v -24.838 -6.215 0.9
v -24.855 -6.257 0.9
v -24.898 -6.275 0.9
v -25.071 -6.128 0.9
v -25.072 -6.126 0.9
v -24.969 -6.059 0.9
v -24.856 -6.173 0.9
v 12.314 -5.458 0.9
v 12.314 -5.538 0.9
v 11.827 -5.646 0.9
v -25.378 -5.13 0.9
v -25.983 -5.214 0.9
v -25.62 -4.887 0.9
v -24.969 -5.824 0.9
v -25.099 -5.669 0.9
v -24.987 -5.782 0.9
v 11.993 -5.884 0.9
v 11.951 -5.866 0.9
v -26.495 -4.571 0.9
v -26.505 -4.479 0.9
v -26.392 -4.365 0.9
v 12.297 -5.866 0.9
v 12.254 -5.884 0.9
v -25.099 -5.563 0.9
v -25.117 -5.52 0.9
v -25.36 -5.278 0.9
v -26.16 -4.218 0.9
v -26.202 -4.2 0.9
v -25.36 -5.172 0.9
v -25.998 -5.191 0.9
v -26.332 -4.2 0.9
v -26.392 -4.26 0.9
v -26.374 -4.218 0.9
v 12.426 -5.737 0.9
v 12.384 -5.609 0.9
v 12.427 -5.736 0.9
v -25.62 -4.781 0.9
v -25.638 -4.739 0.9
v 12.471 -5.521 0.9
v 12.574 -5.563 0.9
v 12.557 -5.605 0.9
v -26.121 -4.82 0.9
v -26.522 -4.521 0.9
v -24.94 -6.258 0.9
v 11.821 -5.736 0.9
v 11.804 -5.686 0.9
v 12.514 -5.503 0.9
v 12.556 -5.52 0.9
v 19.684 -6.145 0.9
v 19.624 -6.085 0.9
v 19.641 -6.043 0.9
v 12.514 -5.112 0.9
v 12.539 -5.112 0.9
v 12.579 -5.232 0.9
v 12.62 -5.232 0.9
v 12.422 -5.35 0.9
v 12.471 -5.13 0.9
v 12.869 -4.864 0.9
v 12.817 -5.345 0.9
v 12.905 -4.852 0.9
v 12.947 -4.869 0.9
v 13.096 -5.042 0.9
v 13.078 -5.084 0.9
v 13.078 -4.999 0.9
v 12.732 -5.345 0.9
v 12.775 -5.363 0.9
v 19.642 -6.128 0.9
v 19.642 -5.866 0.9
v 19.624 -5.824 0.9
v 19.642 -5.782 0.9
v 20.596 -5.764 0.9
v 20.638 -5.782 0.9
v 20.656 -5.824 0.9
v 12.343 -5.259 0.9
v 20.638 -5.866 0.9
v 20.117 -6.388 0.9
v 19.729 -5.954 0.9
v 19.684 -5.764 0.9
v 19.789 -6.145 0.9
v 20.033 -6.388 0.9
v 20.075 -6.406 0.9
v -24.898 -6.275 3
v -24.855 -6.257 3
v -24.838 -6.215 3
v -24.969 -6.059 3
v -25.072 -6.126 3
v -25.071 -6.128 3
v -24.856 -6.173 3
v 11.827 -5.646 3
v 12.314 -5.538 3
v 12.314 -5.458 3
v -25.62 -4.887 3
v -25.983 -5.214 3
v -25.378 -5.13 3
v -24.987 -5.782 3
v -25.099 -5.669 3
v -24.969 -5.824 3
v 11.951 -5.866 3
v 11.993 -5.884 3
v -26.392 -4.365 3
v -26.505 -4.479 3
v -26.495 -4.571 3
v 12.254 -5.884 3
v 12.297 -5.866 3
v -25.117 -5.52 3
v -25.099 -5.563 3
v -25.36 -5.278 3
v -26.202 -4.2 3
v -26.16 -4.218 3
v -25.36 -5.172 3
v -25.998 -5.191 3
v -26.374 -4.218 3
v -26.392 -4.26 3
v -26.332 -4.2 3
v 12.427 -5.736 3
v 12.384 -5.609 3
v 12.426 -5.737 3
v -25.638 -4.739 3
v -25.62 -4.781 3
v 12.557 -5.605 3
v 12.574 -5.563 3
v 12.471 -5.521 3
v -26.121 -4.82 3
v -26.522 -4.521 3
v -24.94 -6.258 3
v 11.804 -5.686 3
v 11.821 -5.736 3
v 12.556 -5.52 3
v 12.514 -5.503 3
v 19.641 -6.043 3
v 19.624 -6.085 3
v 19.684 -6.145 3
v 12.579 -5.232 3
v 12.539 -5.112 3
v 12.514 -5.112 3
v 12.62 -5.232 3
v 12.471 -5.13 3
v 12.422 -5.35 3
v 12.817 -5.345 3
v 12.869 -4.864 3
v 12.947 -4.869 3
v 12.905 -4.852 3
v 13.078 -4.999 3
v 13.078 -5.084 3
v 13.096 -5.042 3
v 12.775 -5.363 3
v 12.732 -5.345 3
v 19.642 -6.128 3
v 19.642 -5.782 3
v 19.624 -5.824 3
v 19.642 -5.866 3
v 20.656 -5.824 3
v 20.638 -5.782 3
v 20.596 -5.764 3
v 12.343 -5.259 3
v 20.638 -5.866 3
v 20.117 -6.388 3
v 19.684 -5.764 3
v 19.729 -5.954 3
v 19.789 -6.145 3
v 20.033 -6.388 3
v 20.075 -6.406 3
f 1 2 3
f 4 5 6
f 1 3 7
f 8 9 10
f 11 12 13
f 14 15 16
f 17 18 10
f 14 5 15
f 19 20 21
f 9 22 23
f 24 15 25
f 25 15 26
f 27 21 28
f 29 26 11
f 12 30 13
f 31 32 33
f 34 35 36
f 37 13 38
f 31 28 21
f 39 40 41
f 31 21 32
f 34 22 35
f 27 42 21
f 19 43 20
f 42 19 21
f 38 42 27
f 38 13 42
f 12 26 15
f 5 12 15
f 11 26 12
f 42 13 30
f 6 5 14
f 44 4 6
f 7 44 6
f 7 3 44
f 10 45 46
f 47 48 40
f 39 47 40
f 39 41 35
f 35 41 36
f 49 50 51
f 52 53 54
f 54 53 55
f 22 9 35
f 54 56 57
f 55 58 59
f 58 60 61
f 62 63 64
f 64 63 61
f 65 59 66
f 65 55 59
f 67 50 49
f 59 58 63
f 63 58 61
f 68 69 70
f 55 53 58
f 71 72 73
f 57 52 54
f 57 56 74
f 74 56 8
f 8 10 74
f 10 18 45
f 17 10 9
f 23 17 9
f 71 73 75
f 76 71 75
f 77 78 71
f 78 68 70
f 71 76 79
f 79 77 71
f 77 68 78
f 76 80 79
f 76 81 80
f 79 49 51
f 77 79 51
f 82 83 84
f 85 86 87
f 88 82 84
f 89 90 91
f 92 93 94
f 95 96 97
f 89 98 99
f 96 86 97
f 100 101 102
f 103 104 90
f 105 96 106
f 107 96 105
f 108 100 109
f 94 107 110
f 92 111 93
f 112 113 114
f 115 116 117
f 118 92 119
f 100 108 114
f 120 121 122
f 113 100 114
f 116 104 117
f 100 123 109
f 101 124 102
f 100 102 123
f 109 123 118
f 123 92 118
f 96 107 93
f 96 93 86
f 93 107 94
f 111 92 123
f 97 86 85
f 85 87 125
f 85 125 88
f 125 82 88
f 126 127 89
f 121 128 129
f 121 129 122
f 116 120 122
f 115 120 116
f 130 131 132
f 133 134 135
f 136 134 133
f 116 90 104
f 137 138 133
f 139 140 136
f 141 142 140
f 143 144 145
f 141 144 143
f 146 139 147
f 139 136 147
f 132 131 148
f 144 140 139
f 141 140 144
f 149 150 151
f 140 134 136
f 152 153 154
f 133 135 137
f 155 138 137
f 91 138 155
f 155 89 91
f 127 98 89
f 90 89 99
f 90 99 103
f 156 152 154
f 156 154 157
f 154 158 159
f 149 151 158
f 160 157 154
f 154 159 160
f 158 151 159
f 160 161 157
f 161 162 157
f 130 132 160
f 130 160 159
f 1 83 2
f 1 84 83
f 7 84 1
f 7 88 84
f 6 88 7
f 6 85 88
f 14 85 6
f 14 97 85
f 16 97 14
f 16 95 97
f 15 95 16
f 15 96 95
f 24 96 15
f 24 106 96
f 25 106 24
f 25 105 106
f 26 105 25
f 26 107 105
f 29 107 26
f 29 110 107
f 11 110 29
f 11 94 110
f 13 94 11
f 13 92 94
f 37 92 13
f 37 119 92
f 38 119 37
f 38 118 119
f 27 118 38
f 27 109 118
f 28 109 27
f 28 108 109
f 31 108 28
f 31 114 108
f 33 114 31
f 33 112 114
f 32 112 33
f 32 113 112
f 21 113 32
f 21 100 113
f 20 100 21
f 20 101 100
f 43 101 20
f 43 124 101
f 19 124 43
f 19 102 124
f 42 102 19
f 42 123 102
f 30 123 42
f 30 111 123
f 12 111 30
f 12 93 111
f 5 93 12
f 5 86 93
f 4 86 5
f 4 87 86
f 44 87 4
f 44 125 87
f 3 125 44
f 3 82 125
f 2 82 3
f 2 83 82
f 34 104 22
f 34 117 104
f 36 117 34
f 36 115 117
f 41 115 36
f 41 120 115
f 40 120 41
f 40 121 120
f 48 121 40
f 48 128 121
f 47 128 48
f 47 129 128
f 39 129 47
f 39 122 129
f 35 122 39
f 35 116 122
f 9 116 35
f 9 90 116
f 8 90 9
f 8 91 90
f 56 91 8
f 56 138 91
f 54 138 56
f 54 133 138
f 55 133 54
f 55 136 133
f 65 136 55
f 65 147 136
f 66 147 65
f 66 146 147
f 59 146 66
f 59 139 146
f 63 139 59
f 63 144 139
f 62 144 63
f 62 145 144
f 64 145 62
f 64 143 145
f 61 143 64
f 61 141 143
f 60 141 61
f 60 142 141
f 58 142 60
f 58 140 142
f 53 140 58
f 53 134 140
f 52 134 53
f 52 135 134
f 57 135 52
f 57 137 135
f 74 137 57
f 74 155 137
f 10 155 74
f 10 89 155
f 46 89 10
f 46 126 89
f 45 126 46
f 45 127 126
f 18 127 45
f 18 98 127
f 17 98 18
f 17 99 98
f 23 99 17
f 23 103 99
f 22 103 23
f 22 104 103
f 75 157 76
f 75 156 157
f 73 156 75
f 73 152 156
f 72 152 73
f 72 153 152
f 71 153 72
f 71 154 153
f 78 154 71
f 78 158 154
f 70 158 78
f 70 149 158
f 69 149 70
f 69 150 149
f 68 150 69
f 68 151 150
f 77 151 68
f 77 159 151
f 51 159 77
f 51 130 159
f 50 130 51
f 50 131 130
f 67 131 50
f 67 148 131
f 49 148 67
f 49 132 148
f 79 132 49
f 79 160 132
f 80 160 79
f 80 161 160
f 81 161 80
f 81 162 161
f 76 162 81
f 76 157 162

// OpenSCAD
$fn = 24;
translate([0, -2.500, 0.900])
  linear_extrude(height=2.100) {
offset(r=0.06, $fn=8) {
    polygon(points=[[19.554,-3.324],[19.684,-3.324],[19.814,-3.454],[19.684,-3.585],[19.814,-3.585],[20.075,-3.846],[20.596,-3.324],[20.857,-3.324]], paths=[[0,1,2,3,4,5,6,7]]);
    polygon(points=[[13.036,-2.542],[12.905,-2.412],[11.863,-3.194],[11.993,-3.324],[12.254,-3.324],[12.514,-3.063],[12.384,-3.194],[12.254,-3.063],[12.254,-2.933],[12.514,-2.672],[12.645,-2.672],[12.775,-2.803]], paths=[[0,1,2,3,4,5,6,7,8,9,10,11]]);
    polygon(points=[[-26.332,-1.760],[-26.332,-1.890],[-26.462,-2.021],[-26.071,-2.281],[-25.941,-2.672],[-24.898,-3.715],[-25.029,-3.585],[-25.029,-3.324],[-25.159,-3.194],[-25.159,-3.063],[-25.420,-2.803],[-25.420,-2.672],[-25.680,-2.412],[-25.680,-2.281],[-26.202,-1.760]], paths=[[0,1,2,3,4,5,6,7,8,9,10,11,12,13,14]]);
}
}
